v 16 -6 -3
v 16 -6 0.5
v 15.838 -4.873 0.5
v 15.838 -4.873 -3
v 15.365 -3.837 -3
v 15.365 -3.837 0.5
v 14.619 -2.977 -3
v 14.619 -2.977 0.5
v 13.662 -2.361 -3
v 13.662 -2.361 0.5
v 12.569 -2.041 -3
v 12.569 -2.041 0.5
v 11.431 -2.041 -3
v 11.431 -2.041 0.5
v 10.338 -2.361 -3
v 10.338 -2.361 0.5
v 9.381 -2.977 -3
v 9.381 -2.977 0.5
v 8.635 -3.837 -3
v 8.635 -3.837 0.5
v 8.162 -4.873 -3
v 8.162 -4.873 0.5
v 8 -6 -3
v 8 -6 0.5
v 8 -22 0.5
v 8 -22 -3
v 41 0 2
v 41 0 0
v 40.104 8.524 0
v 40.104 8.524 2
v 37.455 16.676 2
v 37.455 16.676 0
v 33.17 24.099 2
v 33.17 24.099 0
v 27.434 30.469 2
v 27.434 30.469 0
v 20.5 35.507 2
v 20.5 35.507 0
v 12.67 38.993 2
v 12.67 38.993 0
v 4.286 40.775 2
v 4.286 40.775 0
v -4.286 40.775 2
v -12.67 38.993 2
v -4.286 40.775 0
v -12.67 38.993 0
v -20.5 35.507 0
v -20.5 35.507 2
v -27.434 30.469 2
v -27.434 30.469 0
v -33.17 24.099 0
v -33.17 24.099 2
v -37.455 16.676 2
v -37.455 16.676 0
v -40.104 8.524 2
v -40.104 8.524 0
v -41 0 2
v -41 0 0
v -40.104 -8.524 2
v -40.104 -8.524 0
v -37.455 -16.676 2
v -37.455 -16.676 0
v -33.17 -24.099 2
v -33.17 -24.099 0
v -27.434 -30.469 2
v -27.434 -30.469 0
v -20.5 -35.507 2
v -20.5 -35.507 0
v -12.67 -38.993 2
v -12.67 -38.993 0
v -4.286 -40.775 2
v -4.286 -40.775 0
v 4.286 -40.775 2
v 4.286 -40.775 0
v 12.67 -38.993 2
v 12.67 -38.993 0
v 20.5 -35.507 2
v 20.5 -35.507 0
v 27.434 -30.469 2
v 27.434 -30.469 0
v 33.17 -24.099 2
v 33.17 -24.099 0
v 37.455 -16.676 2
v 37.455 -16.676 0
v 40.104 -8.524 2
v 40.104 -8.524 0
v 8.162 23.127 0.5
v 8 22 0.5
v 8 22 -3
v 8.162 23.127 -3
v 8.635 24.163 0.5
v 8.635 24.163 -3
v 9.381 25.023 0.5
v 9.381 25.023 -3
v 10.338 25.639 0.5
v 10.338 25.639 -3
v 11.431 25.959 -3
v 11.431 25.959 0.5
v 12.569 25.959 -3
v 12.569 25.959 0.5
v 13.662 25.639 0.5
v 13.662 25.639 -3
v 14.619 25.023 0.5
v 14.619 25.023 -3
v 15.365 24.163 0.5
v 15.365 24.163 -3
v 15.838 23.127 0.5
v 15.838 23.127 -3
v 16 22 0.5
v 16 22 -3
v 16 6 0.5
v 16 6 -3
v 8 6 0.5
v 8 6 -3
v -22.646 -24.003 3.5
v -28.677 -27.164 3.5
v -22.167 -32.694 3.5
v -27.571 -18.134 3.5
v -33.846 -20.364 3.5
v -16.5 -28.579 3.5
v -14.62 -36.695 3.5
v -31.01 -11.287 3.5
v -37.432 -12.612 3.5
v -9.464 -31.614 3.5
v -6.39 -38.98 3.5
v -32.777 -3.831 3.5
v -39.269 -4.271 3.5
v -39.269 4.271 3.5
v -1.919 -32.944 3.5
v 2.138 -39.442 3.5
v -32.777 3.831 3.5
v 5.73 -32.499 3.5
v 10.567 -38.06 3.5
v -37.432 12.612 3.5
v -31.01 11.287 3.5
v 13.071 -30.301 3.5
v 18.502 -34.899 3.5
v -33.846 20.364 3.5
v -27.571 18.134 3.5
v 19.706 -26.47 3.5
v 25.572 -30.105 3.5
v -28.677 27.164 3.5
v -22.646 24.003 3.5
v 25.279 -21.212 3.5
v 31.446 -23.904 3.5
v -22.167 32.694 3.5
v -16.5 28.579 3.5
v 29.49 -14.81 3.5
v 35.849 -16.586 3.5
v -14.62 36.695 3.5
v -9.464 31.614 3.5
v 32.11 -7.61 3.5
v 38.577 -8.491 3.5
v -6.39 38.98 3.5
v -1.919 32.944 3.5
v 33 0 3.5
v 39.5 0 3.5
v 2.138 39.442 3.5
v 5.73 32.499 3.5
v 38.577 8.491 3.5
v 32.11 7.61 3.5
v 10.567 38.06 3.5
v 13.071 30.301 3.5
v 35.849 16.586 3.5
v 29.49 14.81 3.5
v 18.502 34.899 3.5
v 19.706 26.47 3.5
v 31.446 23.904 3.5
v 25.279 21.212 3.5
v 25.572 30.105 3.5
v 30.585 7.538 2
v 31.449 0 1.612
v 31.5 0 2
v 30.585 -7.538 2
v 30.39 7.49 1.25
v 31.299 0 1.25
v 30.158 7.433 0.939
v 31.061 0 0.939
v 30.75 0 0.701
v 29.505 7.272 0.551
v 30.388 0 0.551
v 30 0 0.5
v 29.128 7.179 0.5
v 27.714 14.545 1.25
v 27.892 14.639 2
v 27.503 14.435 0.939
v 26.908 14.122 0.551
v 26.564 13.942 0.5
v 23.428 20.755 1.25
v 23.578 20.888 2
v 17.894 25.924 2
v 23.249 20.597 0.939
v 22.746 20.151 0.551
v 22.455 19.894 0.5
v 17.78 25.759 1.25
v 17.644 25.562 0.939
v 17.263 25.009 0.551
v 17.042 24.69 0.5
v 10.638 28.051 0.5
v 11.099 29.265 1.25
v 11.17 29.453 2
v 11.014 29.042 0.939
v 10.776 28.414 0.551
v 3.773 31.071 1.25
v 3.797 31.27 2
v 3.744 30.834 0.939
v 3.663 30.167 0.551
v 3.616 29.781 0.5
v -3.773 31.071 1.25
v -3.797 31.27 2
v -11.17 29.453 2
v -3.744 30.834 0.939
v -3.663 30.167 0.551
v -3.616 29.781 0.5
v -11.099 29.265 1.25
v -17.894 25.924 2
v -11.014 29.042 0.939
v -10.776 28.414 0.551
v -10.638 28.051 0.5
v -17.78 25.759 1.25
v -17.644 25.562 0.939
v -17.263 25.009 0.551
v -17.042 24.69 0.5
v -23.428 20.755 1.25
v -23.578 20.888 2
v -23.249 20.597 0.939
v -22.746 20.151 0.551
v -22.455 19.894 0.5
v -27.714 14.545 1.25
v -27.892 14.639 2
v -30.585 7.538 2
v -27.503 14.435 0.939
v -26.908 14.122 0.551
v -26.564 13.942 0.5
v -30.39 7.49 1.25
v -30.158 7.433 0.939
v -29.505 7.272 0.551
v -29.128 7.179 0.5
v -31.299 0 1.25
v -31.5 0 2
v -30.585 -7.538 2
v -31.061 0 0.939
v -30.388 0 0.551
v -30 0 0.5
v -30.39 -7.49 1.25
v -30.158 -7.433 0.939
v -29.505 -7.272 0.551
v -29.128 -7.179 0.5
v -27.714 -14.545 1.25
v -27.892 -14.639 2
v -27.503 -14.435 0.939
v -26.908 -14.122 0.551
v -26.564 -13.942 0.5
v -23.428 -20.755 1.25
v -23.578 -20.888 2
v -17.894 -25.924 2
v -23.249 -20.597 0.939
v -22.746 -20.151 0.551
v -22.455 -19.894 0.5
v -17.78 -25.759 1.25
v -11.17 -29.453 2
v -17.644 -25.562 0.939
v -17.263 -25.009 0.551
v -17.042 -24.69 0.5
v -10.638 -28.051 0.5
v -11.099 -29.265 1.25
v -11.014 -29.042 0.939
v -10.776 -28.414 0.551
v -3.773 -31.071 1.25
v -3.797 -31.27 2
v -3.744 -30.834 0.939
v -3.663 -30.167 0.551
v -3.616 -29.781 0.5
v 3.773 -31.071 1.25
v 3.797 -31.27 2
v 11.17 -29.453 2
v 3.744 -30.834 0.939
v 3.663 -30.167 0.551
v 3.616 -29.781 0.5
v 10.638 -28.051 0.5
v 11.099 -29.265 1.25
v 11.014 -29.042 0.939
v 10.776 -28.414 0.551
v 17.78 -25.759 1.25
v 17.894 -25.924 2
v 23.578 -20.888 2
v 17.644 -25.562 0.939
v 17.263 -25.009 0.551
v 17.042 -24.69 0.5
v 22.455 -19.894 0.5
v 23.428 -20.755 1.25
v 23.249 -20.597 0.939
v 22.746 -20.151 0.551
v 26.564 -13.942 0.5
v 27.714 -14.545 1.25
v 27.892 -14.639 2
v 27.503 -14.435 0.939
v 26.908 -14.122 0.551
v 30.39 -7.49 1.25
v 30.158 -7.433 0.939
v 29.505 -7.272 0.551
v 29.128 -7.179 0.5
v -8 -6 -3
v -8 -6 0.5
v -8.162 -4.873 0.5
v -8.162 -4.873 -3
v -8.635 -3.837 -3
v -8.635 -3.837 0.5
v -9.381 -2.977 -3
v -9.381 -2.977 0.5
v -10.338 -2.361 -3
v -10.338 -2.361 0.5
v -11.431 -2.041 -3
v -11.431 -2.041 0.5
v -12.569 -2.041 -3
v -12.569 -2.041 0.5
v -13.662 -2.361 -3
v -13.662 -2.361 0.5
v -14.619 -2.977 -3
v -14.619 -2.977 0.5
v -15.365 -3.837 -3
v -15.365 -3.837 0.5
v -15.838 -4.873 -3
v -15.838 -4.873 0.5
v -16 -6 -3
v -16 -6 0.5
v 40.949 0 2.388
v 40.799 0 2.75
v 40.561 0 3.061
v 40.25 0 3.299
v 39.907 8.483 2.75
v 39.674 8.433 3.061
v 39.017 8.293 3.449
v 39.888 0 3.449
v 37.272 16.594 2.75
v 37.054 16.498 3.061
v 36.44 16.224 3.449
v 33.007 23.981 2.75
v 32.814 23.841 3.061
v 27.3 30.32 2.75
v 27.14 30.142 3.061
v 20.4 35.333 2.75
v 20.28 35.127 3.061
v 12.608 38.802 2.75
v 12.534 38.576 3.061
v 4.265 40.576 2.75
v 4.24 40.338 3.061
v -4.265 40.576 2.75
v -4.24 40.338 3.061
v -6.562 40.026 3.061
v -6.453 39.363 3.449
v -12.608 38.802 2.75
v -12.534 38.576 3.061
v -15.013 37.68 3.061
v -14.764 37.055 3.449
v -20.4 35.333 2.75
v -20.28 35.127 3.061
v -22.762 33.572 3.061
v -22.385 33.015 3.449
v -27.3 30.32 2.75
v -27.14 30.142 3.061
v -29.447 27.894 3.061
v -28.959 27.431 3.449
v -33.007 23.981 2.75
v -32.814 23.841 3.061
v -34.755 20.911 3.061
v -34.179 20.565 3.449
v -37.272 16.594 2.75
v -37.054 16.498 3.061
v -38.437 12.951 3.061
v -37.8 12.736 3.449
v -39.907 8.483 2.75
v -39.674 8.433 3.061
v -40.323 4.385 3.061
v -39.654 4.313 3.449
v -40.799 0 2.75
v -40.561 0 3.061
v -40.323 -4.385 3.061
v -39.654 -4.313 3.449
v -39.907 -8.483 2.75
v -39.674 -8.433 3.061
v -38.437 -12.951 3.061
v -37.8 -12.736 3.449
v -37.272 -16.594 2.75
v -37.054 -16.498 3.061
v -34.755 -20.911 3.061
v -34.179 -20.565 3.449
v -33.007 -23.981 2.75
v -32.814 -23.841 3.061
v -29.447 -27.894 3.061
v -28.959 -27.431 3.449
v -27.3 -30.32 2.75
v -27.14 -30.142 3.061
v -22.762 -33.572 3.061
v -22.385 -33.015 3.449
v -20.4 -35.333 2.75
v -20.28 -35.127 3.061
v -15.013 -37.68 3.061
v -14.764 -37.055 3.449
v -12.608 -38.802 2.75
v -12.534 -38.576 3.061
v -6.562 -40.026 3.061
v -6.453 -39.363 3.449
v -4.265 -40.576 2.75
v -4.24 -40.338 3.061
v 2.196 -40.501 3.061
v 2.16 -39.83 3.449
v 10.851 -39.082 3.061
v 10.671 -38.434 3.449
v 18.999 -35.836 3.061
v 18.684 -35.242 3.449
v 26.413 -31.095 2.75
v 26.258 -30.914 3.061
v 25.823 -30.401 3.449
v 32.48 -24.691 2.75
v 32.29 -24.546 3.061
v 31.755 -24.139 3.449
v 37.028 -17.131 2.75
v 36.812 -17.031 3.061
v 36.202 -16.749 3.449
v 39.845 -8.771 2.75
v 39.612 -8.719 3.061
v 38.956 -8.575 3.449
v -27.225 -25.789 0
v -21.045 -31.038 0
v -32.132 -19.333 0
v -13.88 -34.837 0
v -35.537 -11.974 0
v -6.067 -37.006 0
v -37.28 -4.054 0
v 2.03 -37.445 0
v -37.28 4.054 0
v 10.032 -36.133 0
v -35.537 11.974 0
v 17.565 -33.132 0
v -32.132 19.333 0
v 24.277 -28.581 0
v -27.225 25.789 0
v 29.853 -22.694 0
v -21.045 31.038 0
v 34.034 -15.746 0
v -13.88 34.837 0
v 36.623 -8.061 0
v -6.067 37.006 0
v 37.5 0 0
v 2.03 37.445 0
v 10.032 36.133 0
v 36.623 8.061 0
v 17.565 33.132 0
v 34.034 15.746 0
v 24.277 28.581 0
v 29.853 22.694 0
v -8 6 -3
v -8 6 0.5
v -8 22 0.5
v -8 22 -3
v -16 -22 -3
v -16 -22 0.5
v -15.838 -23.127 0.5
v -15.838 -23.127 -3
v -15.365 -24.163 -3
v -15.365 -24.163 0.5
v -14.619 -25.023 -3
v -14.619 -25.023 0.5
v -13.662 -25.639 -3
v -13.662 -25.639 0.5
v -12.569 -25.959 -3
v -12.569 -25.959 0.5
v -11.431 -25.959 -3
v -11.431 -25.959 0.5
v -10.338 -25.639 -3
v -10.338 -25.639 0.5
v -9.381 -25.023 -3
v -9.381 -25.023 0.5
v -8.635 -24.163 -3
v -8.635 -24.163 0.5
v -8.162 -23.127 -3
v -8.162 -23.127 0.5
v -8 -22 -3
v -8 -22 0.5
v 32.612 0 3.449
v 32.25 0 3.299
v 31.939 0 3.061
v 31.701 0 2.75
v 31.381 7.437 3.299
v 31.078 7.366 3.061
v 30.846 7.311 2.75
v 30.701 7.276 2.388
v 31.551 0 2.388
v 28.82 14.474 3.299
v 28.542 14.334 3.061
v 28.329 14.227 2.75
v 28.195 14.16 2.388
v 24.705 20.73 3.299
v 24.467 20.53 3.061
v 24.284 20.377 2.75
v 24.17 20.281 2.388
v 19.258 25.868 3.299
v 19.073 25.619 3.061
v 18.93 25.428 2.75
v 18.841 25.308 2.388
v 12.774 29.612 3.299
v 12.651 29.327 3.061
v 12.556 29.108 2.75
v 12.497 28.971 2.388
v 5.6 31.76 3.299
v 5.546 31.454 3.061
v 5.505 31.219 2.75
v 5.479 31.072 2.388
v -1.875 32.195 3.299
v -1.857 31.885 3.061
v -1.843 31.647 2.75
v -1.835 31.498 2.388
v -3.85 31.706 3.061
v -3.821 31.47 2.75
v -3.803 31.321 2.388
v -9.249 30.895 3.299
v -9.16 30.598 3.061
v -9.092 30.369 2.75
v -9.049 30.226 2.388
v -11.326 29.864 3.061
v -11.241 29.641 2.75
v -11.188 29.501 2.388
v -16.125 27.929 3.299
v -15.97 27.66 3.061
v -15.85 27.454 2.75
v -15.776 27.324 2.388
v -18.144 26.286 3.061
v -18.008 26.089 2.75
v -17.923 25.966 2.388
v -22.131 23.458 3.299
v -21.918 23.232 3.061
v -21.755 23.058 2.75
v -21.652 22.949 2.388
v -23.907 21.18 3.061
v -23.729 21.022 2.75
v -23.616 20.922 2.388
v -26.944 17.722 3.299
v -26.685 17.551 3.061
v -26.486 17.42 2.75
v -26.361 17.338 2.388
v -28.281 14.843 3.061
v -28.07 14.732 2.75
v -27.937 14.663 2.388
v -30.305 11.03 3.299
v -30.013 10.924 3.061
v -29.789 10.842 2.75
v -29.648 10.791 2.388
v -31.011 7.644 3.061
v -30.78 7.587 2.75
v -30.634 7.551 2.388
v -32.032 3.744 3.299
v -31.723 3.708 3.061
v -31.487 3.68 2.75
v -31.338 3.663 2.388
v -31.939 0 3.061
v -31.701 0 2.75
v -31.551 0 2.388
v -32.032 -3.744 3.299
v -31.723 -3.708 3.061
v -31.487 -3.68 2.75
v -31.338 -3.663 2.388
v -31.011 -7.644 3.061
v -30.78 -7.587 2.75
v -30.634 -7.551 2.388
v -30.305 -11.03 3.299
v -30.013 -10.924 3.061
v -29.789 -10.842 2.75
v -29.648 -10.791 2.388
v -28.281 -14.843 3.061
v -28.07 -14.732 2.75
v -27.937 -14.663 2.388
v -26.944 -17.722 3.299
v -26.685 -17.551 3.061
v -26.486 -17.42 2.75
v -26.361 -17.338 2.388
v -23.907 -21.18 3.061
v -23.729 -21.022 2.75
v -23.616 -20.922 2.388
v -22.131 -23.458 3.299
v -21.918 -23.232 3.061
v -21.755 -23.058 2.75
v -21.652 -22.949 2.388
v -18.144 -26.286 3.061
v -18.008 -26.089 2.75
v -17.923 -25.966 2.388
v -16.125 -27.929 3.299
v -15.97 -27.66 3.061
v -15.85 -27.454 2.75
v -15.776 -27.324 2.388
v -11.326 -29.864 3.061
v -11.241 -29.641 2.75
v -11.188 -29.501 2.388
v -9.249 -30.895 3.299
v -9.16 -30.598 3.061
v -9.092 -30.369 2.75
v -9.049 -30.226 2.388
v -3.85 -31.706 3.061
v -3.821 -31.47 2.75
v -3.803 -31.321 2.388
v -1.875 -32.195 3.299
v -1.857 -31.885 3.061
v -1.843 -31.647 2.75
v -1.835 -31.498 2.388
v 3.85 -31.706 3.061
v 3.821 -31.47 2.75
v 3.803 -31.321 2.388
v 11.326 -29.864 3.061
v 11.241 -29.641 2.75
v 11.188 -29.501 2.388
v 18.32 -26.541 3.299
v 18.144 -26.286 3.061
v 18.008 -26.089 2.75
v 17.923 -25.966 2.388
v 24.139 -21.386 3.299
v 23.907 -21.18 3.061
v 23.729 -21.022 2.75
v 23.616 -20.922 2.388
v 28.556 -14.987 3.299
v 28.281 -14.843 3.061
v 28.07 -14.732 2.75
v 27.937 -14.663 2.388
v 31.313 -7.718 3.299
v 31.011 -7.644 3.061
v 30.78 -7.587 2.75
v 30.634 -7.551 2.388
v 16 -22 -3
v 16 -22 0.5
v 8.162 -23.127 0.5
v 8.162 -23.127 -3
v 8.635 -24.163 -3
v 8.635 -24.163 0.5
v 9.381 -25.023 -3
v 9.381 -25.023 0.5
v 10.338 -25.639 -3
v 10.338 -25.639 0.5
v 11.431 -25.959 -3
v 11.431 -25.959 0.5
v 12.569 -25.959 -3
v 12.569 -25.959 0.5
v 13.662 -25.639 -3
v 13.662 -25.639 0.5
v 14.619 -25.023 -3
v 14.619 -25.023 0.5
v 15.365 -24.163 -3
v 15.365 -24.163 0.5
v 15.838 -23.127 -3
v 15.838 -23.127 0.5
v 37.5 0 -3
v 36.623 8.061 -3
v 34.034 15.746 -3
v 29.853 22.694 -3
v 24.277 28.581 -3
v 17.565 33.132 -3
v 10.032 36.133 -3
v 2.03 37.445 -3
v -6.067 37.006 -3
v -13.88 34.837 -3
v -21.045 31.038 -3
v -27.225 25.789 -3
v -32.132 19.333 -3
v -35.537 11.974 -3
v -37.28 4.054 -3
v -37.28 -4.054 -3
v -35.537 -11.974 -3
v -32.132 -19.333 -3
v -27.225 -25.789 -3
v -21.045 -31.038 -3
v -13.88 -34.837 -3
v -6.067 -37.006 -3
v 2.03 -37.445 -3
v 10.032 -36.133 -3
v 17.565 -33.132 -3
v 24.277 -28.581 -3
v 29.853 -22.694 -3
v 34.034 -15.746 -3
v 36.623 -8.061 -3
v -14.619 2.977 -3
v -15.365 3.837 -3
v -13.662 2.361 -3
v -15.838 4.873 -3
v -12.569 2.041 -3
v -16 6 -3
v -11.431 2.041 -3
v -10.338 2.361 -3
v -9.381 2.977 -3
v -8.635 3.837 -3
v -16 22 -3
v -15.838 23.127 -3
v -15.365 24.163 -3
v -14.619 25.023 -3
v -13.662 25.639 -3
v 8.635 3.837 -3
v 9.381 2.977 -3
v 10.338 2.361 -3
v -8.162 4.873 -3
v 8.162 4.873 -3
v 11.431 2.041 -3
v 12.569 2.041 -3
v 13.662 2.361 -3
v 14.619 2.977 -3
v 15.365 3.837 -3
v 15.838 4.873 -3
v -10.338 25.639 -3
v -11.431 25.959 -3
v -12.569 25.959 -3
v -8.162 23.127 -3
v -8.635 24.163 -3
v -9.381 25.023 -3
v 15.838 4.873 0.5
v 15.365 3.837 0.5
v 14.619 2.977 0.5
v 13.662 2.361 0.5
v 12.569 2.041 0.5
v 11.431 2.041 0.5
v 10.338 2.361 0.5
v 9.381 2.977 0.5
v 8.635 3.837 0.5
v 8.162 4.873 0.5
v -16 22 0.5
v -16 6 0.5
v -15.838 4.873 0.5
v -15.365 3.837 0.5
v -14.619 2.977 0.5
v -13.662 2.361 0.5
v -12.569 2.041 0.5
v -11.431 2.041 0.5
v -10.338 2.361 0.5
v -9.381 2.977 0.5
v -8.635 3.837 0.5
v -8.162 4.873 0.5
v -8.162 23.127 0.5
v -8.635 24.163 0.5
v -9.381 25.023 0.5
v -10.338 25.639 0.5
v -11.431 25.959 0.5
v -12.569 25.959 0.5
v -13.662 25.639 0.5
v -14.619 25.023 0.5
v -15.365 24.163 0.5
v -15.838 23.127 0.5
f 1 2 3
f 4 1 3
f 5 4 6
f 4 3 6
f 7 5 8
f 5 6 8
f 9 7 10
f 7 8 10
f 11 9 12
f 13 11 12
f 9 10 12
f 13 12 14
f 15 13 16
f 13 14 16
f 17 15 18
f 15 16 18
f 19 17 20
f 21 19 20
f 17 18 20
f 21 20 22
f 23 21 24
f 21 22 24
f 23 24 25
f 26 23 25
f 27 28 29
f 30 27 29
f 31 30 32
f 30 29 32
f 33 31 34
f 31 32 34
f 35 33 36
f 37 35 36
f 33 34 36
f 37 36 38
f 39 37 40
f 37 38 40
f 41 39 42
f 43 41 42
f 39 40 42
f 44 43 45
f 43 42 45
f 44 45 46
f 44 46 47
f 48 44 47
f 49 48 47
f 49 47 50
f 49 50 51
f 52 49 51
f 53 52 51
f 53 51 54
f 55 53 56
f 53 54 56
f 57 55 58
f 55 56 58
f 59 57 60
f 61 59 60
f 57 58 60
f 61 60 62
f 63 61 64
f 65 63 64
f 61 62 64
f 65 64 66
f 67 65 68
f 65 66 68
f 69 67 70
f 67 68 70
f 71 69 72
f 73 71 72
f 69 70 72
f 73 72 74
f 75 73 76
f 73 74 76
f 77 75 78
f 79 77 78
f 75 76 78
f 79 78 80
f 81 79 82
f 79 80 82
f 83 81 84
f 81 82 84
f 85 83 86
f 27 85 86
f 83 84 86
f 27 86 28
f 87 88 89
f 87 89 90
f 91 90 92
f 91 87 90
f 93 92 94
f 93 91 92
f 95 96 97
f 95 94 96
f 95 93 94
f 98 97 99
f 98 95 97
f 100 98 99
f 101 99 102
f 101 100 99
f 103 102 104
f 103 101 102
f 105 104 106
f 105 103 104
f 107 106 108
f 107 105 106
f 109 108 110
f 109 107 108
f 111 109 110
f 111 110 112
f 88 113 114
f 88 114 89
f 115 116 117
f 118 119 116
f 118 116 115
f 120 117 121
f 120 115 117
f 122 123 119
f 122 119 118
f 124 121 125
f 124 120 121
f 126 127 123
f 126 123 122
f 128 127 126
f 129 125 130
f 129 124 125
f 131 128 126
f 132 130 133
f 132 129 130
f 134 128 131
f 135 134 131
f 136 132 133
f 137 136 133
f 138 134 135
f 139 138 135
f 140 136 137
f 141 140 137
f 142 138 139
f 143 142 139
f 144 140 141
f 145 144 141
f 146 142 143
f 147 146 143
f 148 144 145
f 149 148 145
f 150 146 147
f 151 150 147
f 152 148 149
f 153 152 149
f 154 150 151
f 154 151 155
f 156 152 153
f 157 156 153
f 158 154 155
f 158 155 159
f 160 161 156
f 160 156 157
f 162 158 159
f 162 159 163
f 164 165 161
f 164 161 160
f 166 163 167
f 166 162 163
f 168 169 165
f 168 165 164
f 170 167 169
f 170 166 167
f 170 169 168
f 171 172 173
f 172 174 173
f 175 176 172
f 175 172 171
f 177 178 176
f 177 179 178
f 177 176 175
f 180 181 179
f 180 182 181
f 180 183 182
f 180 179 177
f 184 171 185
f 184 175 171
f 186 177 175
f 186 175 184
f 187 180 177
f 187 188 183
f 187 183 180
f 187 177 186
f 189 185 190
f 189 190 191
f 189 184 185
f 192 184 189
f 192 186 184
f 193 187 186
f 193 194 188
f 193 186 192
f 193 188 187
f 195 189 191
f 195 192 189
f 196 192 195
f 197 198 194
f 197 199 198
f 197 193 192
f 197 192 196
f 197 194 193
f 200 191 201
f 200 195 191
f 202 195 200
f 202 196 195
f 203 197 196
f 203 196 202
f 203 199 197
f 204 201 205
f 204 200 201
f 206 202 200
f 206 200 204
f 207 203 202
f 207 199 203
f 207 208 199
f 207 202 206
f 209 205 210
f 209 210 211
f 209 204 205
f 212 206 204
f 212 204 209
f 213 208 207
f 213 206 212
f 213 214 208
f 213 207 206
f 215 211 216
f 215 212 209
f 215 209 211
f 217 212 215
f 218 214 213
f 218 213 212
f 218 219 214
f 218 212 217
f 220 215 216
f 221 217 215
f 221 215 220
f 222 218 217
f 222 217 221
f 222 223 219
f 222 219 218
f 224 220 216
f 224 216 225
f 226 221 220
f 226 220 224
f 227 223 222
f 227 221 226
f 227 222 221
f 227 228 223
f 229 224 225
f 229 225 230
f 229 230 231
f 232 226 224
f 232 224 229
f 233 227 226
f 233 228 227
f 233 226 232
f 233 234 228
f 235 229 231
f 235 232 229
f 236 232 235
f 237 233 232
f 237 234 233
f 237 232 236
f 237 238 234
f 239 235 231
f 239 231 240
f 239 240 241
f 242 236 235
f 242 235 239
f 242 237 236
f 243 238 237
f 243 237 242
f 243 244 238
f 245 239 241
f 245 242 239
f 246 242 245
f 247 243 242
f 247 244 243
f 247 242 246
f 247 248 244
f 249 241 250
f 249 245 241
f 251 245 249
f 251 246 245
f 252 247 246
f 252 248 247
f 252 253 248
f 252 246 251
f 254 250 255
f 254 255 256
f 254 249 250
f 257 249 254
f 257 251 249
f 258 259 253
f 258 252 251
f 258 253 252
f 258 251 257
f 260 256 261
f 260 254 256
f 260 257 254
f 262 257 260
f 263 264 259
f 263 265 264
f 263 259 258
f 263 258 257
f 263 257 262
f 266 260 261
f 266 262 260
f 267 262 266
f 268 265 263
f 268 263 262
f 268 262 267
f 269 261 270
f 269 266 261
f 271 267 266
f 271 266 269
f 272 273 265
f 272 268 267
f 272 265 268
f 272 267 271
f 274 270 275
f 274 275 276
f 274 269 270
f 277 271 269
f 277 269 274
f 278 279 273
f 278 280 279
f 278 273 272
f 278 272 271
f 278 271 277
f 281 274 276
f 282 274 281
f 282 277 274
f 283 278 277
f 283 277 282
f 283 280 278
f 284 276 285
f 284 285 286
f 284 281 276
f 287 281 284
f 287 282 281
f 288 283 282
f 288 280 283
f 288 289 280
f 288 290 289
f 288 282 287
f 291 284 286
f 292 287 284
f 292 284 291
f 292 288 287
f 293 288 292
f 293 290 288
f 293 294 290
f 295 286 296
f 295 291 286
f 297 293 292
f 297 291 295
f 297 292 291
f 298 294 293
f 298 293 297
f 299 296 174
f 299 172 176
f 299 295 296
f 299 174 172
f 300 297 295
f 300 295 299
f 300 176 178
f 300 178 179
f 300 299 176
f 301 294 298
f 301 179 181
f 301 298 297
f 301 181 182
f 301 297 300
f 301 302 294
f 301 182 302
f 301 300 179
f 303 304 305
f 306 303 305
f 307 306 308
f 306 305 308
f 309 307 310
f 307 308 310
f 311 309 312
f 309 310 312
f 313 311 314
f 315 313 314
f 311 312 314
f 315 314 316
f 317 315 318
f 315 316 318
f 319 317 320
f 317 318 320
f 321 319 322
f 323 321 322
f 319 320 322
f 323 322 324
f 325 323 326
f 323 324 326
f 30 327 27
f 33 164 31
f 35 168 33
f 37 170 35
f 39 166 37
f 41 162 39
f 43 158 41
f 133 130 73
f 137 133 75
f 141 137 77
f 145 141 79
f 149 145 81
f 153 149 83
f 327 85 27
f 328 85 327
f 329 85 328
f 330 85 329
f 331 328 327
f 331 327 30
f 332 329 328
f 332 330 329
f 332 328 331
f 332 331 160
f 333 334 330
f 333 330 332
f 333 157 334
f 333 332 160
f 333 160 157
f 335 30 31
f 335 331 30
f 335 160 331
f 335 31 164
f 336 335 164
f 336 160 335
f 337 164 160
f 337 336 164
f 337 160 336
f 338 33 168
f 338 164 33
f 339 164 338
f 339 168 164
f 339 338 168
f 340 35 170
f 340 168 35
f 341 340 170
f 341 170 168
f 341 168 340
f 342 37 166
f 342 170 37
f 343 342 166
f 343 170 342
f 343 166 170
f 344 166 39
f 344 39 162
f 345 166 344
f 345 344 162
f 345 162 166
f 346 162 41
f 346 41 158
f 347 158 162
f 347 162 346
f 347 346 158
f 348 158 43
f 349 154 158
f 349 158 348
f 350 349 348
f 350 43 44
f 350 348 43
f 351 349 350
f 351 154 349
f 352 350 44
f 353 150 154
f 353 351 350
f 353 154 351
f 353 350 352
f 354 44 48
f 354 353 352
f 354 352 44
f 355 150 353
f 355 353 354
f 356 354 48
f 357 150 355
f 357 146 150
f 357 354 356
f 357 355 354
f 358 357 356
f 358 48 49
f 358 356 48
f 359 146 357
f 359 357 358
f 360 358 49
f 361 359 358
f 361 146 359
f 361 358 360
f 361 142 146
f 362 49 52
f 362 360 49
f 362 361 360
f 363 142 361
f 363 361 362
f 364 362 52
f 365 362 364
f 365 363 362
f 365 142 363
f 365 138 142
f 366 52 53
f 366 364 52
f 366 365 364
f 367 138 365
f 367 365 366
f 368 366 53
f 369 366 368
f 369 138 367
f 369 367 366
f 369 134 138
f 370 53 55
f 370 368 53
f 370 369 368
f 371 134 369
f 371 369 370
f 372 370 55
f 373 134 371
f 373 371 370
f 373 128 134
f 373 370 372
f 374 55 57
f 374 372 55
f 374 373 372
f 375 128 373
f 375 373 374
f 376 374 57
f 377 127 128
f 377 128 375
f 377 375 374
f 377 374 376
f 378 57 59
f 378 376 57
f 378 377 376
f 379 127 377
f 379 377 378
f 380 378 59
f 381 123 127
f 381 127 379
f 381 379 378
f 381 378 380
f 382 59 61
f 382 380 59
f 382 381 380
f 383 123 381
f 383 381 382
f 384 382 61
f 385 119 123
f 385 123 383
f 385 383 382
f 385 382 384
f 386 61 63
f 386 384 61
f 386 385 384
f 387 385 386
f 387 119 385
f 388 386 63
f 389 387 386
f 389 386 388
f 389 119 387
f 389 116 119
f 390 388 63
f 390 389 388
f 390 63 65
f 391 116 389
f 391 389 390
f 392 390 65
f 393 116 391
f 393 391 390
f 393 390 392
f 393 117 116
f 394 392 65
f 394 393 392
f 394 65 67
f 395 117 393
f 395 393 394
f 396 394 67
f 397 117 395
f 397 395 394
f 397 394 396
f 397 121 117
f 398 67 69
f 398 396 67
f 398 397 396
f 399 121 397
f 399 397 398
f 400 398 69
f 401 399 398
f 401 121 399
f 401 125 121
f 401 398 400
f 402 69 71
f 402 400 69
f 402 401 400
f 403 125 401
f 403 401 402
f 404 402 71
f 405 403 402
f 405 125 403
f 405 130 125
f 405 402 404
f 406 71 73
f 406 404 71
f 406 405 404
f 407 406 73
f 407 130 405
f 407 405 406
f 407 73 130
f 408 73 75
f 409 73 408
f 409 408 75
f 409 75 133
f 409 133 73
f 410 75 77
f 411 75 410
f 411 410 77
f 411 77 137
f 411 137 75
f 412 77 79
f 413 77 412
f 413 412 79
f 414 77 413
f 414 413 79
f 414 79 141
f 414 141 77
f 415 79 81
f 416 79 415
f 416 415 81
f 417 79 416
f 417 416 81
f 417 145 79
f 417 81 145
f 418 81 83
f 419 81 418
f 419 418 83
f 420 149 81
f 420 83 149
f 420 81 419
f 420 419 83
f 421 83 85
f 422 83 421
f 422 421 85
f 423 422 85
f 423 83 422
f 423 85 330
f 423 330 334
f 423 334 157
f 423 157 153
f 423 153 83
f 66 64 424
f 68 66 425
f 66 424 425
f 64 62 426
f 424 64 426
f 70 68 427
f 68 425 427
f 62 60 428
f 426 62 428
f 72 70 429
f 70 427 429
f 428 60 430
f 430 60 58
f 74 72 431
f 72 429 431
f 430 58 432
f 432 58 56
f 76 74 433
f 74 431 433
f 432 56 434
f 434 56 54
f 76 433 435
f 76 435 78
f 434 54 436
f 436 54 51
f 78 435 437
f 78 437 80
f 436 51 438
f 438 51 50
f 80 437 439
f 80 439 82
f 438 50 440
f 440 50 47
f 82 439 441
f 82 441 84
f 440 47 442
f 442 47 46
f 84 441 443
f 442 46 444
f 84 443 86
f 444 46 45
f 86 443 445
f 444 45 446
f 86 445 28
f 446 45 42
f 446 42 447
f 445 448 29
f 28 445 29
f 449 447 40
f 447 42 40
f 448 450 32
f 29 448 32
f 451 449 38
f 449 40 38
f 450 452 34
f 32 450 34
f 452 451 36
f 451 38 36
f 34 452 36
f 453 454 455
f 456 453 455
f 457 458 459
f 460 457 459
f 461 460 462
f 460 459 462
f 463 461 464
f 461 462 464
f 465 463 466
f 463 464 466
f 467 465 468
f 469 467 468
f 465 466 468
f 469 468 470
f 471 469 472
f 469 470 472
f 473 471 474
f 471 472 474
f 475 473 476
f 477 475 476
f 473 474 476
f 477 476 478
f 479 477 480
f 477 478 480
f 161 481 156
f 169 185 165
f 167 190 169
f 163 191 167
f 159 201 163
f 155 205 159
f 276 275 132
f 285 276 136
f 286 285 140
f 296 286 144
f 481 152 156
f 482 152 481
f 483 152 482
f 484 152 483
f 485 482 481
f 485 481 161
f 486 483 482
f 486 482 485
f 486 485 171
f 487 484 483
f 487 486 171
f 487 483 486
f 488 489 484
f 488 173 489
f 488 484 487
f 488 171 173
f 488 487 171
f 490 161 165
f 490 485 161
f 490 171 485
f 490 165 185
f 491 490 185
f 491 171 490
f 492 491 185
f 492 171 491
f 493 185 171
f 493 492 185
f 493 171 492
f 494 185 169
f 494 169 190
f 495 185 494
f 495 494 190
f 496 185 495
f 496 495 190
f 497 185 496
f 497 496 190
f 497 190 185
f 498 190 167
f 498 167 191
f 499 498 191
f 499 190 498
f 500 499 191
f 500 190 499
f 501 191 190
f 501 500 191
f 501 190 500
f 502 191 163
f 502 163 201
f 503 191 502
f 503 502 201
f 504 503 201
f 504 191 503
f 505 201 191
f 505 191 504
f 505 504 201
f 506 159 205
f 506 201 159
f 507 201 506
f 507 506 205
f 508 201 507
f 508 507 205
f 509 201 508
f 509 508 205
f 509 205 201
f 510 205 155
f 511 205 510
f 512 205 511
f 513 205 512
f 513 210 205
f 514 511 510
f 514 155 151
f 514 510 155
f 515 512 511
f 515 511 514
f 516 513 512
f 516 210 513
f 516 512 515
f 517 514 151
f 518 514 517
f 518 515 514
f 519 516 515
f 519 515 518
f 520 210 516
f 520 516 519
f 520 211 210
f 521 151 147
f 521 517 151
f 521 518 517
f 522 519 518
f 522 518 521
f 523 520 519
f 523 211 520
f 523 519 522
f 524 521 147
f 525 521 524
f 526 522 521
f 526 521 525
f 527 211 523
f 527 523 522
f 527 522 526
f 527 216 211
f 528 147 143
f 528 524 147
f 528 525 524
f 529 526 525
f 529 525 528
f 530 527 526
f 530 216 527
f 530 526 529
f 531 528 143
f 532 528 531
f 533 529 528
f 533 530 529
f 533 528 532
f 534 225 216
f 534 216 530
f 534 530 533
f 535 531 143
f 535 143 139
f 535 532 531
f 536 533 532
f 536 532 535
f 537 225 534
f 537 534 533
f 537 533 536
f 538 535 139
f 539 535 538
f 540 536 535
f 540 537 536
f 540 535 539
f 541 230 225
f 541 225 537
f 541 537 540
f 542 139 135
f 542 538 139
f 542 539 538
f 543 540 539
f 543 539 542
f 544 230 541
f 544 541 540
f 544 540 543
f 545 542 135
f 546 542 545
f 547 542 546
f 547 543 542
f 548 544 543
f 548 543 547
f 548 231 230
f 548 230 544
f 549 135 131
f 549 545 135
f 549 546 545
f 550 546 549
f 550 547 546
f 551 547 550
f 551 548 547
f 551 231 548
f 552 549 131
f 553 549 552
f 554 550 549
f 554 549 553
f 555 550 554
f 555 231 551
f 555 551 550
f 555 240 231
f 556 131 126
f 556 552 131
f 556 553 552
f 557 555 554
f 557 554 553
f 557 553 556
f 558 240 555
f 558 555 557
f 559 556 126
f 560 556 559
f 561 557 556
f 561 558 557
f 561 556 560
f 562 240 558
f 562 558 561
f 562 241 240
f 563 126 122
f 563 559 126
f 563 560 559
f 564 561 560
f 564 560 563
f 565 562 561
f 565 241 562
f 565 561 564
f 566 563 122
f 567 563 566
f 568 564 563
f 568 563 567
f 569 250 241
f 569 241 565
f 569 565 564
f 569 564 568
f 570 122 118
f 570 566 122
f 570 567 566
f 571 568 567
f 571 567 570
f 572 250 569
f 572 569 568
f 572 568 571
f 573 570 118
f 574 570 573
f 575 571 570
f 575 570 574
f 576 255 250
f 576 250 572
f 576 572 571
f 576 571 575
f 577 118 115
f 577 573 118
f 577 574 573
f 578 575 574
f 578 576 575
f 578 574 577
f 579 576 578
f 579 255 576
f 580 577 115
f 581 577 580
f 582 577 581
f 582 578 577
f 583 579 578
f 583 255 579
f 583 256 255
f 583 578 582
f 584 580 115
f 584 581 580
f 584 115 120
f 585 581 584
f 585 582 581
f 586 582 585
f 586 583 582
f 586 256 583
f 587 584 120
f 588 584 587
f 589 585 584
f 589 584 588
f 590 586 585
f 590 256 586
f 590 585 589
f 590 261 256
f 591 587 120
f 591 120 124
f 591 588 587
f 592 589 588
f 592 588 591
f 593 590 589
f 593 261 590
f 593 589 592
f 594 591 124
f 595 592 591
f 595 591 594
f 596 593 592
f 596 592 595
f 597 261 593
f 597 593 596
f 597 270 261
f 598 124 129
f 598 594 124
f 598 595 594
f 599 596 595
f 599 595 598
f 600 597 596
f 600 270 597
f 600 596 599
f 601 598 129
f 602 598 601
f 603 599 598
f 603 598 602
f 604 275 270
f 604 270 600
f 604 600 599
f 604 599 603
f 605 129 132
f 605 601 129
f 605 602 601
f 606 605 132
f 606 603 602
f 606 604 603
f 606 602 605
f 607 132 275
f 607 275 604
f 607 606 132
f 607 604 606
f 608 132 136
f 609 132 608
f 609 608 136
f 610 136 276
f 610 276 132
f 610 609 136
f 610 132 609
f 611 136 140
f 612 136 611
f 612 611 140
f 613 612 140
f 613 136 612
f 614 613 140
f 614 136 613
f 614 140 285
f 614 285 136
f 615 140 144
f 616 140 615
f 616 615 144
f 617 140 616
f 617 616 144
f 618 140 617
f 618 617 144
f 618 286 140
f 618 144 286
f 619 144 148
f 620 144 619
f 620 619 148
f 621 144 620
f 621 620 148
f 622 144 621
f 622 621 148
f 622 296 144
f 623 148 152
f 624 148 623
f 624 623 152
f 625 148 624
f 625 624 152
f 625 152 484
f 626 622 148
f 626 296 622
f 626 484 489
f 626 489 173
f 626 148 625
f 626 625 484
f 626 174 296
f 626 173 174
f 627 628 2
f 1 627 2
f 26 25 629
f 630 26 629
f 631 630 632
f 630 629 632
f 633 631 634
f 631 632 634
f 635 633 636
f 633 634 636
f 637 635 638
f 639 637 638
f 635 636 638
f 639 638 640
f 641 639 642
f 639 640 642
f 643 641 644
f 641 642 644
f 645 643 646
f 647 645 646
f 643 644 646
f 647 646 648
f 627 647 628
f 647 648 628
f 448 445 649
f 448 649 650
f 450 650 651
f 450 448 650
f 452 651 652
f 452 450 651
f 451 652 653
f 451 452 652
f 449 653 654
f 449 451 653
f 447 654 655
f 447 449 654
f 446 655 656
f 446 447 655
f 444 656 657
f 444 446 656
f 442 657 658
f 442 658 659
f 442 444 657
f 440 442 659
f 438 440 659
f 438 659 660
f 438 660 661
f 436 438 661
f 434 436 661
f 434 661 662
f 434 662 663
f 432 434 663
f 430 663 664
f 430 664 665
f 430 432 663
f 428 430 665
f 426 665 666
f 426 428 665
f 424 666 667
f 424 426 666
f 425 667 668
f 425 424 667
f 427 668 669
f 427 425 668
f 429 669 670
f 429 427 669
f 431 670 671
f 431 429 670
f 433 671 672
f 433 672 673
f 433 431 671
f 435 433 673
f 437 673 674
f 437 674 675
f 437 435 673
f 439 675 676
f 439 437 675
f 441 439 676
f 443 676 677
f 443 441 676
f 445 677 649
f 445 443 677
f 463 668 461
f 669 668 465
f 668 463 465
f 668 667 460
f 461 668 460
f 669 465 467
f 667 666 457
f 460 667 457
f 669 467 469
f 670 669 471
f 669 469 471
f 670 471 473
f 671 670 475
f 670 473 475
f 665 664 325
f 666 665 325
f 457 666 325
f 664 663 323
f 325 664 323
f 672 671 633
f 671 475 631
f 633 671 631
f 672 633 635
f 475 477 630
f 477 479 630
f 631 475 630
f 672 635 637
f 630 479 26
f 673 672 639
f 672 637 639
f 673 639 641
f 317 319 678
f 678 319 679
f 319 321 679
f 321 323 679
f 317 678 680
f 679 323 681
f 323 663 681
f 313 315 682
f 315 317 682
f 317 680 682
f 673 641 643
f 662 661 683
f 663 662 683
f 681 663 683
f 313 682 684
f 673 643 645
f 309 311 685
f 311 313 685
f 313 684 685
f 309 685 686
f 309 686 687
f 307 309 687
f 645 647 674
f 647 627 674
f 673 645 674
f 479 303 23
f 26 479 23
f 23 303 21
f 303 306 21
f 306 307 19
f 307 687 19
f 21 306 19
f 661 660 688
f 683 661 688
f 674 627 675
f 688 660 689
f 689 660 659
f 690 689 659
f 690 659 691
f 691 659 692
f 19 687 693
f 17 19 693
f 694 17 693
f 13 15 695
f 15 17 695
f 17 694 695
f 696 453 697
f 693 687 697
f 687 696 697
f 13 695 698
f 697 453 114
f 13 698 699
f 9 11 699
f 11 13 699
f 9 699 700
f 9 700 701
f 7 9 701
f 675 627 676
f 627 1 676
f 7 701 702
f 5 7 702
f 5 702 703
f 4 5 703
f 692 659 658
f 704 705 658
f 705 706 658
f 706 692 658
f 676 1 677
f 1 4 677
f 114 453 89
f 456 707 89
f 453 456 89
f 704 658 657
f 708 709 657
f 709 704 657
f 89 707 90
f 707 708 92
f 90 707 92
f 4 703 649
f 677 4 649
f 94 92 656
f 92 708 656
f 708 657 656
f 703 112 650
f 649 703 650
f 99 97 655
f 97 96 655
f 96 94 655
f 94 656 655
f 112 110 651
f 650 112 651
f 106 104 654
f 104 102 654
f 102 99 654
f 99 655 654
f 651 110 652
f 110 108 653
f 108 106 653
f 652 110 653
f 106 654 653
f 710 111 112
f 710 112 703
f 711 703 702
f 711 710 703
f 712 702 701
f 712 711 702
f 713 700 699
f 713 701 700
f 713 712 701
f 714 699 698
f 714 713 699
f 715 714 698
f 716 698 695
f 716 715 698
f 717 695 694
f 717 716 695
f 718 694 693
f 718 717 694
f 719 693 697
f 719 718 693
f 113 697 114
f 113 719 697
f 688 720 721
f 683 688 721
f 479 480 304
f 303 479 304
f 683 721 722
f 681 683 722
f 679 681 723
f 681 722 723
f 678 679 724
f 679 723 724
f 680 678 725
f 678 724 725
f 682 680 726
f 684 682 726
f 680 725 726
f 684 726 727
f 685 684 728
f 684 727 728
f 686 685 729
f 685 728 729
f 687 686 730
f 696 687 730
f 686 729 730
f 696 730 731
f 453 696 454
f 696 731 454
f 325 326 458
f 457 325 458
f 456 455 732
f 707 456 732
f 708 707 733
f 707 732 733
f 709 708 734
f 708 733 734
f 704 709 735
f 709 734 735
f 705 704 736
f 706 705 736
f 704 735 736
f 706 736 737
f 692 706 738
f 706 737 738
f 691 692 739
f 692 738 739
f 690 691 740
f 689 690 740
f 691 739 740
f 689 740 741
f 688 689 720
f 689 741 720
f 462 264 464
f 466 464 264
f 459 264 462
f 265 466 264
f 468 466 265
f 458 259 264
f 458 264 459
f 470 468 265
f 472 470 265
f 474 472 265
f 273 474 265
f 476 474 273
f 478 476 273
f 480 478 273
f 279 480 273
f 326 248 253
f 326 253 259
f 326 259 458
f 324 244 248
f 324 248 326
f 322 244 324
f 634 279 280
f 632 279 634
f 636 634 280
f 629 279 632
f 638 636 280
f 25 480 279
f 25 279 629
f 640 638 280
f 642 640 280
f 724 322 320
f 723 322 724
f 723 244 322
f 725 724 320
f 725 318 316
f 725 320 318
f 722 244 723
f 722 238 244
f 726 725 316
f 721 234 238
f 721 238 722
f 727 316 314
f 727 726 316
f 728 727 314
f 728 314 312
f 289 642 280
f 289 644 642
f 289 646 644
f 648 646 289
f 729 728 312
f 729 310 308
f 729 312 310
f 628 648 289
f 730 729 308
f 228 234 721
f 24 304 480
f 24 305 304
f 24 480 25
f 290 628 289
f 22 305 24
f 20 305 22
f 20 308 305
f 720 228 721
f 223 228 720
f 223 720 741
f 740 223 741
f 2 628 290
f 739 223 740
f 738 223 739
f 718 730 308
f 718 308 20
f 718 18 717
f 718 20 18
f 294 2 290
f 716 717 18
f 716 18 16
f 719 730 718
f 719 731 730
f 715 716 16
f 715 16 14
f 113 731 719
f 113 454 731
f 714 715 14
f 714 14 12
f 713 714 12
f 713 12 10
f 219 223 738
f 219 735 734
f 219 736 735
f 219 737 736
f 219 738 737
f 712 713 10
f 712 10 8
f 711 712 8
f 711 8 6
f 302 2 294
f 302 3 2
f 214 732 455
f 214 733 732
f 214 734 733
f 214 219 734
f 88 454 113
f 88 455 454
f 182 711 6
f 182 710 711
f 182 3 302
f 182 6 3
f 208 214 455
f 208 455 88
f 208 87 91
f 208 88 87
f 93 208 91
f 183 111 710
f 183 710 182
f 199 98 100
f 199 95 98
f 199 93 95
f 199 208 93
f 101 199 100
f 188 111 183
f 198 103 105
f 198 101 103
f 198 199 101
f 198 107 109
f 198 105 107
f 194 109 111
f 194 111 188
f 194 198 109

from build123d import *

# Parameters (mm, degrees)
SKETCH1_R           = 41
BOSS_EXTRUDE1_DEPTH = 3.5
SKETCH2_R           = 37.5
BOSS_EXTRUDE2_DEPTH = 3
SKETCH4_R           = 31.5
CUT_EXTRUDE3_DEPTH  = 3
CUT_EXTRUDE4_DEPTH  = 21
FILLET1_R           = 1.5


with BuildPart() as part:
    # Sketch1 → Boss-Extrude1 (new body)
    with BuildSketch(Plane.XY):
        Circle(SKETCH1_R)
    extrude(amount=BOSS_EXTRUDE1_DEPTH)

    # Sketch2 → Boss-Extrude2 (add)
    with BuildSketch(Plane.XY):
        Circle(SKETCH2_R)
    extrude(amount=-BOSS_EXTRUDE2_DEPTH)

    # Sketch4 → Cut-Extrude3 (cut)
    with BuildSketch(Plane.XY.offset(3.5)):
        Circle(SKETCH4_R)
    extrude(amount=-CUT_EXTRUDE3_DEPTH, mode=Mode.SUBTRACT)

    # Sketch5 → Cut-Extrude4 (cut)
    with BuildSketch(Plane.XY.offset(3.5)):
        with BuildLine():
            Line((-16, 22), (-16, 6))
            ThreePointArc((-16, 6), (-12, 2), (-8, 6))
            Line((-8, 6), (-8, 22))
            ThreePointArc((-8, 22), (-12, 26), (-16, 22))
        make_face()
        with BuildLine():
            Line((-8, -22), (-8, -6))
            ThreePointArc((-8, -6), (-12, -2), (-16, -6))
            Line((-16, -6), (-16, -22))
            ThreePointArc((-16, -22), (-12, -26), (-8, -22))
        make_face()
        with BuildLine():
            Line((16, -22), (16, -6))
            ThreePointArc((16, -6), (12, -2), (8, -6))
            Line((8, -6), (8, -22))
            ThreePointArc((8, -22), (12, -26), (16, -22))
        make_face()
        with BuildLine():
            Line((16, 22), (16, 6))
            ThreePointArc((16, 6), (12, 2), (8, 6))
            Line((8, 6), (8, 22))
            ThreePointArc((8, 22), (12, 26), (16, 22))
        make_face()
    extrude(amount=-CUT_EXTRUDE4_DEPTH, mode=Mode.SUBTRACT)

    # Fillet1
    fillet1_edges = [part.edges().sort_by_distance(p)[0] for p in [
        (-31.5, 0, 0.5),
        (-31.5, 0, 3.5),
        (-41, 0, 3.5),
    ]]
    fillet(fillet1_edges, radius=FILLET1_R - 0.0001)  # a hair under: the kernel refuses the full size


solid = part.part
